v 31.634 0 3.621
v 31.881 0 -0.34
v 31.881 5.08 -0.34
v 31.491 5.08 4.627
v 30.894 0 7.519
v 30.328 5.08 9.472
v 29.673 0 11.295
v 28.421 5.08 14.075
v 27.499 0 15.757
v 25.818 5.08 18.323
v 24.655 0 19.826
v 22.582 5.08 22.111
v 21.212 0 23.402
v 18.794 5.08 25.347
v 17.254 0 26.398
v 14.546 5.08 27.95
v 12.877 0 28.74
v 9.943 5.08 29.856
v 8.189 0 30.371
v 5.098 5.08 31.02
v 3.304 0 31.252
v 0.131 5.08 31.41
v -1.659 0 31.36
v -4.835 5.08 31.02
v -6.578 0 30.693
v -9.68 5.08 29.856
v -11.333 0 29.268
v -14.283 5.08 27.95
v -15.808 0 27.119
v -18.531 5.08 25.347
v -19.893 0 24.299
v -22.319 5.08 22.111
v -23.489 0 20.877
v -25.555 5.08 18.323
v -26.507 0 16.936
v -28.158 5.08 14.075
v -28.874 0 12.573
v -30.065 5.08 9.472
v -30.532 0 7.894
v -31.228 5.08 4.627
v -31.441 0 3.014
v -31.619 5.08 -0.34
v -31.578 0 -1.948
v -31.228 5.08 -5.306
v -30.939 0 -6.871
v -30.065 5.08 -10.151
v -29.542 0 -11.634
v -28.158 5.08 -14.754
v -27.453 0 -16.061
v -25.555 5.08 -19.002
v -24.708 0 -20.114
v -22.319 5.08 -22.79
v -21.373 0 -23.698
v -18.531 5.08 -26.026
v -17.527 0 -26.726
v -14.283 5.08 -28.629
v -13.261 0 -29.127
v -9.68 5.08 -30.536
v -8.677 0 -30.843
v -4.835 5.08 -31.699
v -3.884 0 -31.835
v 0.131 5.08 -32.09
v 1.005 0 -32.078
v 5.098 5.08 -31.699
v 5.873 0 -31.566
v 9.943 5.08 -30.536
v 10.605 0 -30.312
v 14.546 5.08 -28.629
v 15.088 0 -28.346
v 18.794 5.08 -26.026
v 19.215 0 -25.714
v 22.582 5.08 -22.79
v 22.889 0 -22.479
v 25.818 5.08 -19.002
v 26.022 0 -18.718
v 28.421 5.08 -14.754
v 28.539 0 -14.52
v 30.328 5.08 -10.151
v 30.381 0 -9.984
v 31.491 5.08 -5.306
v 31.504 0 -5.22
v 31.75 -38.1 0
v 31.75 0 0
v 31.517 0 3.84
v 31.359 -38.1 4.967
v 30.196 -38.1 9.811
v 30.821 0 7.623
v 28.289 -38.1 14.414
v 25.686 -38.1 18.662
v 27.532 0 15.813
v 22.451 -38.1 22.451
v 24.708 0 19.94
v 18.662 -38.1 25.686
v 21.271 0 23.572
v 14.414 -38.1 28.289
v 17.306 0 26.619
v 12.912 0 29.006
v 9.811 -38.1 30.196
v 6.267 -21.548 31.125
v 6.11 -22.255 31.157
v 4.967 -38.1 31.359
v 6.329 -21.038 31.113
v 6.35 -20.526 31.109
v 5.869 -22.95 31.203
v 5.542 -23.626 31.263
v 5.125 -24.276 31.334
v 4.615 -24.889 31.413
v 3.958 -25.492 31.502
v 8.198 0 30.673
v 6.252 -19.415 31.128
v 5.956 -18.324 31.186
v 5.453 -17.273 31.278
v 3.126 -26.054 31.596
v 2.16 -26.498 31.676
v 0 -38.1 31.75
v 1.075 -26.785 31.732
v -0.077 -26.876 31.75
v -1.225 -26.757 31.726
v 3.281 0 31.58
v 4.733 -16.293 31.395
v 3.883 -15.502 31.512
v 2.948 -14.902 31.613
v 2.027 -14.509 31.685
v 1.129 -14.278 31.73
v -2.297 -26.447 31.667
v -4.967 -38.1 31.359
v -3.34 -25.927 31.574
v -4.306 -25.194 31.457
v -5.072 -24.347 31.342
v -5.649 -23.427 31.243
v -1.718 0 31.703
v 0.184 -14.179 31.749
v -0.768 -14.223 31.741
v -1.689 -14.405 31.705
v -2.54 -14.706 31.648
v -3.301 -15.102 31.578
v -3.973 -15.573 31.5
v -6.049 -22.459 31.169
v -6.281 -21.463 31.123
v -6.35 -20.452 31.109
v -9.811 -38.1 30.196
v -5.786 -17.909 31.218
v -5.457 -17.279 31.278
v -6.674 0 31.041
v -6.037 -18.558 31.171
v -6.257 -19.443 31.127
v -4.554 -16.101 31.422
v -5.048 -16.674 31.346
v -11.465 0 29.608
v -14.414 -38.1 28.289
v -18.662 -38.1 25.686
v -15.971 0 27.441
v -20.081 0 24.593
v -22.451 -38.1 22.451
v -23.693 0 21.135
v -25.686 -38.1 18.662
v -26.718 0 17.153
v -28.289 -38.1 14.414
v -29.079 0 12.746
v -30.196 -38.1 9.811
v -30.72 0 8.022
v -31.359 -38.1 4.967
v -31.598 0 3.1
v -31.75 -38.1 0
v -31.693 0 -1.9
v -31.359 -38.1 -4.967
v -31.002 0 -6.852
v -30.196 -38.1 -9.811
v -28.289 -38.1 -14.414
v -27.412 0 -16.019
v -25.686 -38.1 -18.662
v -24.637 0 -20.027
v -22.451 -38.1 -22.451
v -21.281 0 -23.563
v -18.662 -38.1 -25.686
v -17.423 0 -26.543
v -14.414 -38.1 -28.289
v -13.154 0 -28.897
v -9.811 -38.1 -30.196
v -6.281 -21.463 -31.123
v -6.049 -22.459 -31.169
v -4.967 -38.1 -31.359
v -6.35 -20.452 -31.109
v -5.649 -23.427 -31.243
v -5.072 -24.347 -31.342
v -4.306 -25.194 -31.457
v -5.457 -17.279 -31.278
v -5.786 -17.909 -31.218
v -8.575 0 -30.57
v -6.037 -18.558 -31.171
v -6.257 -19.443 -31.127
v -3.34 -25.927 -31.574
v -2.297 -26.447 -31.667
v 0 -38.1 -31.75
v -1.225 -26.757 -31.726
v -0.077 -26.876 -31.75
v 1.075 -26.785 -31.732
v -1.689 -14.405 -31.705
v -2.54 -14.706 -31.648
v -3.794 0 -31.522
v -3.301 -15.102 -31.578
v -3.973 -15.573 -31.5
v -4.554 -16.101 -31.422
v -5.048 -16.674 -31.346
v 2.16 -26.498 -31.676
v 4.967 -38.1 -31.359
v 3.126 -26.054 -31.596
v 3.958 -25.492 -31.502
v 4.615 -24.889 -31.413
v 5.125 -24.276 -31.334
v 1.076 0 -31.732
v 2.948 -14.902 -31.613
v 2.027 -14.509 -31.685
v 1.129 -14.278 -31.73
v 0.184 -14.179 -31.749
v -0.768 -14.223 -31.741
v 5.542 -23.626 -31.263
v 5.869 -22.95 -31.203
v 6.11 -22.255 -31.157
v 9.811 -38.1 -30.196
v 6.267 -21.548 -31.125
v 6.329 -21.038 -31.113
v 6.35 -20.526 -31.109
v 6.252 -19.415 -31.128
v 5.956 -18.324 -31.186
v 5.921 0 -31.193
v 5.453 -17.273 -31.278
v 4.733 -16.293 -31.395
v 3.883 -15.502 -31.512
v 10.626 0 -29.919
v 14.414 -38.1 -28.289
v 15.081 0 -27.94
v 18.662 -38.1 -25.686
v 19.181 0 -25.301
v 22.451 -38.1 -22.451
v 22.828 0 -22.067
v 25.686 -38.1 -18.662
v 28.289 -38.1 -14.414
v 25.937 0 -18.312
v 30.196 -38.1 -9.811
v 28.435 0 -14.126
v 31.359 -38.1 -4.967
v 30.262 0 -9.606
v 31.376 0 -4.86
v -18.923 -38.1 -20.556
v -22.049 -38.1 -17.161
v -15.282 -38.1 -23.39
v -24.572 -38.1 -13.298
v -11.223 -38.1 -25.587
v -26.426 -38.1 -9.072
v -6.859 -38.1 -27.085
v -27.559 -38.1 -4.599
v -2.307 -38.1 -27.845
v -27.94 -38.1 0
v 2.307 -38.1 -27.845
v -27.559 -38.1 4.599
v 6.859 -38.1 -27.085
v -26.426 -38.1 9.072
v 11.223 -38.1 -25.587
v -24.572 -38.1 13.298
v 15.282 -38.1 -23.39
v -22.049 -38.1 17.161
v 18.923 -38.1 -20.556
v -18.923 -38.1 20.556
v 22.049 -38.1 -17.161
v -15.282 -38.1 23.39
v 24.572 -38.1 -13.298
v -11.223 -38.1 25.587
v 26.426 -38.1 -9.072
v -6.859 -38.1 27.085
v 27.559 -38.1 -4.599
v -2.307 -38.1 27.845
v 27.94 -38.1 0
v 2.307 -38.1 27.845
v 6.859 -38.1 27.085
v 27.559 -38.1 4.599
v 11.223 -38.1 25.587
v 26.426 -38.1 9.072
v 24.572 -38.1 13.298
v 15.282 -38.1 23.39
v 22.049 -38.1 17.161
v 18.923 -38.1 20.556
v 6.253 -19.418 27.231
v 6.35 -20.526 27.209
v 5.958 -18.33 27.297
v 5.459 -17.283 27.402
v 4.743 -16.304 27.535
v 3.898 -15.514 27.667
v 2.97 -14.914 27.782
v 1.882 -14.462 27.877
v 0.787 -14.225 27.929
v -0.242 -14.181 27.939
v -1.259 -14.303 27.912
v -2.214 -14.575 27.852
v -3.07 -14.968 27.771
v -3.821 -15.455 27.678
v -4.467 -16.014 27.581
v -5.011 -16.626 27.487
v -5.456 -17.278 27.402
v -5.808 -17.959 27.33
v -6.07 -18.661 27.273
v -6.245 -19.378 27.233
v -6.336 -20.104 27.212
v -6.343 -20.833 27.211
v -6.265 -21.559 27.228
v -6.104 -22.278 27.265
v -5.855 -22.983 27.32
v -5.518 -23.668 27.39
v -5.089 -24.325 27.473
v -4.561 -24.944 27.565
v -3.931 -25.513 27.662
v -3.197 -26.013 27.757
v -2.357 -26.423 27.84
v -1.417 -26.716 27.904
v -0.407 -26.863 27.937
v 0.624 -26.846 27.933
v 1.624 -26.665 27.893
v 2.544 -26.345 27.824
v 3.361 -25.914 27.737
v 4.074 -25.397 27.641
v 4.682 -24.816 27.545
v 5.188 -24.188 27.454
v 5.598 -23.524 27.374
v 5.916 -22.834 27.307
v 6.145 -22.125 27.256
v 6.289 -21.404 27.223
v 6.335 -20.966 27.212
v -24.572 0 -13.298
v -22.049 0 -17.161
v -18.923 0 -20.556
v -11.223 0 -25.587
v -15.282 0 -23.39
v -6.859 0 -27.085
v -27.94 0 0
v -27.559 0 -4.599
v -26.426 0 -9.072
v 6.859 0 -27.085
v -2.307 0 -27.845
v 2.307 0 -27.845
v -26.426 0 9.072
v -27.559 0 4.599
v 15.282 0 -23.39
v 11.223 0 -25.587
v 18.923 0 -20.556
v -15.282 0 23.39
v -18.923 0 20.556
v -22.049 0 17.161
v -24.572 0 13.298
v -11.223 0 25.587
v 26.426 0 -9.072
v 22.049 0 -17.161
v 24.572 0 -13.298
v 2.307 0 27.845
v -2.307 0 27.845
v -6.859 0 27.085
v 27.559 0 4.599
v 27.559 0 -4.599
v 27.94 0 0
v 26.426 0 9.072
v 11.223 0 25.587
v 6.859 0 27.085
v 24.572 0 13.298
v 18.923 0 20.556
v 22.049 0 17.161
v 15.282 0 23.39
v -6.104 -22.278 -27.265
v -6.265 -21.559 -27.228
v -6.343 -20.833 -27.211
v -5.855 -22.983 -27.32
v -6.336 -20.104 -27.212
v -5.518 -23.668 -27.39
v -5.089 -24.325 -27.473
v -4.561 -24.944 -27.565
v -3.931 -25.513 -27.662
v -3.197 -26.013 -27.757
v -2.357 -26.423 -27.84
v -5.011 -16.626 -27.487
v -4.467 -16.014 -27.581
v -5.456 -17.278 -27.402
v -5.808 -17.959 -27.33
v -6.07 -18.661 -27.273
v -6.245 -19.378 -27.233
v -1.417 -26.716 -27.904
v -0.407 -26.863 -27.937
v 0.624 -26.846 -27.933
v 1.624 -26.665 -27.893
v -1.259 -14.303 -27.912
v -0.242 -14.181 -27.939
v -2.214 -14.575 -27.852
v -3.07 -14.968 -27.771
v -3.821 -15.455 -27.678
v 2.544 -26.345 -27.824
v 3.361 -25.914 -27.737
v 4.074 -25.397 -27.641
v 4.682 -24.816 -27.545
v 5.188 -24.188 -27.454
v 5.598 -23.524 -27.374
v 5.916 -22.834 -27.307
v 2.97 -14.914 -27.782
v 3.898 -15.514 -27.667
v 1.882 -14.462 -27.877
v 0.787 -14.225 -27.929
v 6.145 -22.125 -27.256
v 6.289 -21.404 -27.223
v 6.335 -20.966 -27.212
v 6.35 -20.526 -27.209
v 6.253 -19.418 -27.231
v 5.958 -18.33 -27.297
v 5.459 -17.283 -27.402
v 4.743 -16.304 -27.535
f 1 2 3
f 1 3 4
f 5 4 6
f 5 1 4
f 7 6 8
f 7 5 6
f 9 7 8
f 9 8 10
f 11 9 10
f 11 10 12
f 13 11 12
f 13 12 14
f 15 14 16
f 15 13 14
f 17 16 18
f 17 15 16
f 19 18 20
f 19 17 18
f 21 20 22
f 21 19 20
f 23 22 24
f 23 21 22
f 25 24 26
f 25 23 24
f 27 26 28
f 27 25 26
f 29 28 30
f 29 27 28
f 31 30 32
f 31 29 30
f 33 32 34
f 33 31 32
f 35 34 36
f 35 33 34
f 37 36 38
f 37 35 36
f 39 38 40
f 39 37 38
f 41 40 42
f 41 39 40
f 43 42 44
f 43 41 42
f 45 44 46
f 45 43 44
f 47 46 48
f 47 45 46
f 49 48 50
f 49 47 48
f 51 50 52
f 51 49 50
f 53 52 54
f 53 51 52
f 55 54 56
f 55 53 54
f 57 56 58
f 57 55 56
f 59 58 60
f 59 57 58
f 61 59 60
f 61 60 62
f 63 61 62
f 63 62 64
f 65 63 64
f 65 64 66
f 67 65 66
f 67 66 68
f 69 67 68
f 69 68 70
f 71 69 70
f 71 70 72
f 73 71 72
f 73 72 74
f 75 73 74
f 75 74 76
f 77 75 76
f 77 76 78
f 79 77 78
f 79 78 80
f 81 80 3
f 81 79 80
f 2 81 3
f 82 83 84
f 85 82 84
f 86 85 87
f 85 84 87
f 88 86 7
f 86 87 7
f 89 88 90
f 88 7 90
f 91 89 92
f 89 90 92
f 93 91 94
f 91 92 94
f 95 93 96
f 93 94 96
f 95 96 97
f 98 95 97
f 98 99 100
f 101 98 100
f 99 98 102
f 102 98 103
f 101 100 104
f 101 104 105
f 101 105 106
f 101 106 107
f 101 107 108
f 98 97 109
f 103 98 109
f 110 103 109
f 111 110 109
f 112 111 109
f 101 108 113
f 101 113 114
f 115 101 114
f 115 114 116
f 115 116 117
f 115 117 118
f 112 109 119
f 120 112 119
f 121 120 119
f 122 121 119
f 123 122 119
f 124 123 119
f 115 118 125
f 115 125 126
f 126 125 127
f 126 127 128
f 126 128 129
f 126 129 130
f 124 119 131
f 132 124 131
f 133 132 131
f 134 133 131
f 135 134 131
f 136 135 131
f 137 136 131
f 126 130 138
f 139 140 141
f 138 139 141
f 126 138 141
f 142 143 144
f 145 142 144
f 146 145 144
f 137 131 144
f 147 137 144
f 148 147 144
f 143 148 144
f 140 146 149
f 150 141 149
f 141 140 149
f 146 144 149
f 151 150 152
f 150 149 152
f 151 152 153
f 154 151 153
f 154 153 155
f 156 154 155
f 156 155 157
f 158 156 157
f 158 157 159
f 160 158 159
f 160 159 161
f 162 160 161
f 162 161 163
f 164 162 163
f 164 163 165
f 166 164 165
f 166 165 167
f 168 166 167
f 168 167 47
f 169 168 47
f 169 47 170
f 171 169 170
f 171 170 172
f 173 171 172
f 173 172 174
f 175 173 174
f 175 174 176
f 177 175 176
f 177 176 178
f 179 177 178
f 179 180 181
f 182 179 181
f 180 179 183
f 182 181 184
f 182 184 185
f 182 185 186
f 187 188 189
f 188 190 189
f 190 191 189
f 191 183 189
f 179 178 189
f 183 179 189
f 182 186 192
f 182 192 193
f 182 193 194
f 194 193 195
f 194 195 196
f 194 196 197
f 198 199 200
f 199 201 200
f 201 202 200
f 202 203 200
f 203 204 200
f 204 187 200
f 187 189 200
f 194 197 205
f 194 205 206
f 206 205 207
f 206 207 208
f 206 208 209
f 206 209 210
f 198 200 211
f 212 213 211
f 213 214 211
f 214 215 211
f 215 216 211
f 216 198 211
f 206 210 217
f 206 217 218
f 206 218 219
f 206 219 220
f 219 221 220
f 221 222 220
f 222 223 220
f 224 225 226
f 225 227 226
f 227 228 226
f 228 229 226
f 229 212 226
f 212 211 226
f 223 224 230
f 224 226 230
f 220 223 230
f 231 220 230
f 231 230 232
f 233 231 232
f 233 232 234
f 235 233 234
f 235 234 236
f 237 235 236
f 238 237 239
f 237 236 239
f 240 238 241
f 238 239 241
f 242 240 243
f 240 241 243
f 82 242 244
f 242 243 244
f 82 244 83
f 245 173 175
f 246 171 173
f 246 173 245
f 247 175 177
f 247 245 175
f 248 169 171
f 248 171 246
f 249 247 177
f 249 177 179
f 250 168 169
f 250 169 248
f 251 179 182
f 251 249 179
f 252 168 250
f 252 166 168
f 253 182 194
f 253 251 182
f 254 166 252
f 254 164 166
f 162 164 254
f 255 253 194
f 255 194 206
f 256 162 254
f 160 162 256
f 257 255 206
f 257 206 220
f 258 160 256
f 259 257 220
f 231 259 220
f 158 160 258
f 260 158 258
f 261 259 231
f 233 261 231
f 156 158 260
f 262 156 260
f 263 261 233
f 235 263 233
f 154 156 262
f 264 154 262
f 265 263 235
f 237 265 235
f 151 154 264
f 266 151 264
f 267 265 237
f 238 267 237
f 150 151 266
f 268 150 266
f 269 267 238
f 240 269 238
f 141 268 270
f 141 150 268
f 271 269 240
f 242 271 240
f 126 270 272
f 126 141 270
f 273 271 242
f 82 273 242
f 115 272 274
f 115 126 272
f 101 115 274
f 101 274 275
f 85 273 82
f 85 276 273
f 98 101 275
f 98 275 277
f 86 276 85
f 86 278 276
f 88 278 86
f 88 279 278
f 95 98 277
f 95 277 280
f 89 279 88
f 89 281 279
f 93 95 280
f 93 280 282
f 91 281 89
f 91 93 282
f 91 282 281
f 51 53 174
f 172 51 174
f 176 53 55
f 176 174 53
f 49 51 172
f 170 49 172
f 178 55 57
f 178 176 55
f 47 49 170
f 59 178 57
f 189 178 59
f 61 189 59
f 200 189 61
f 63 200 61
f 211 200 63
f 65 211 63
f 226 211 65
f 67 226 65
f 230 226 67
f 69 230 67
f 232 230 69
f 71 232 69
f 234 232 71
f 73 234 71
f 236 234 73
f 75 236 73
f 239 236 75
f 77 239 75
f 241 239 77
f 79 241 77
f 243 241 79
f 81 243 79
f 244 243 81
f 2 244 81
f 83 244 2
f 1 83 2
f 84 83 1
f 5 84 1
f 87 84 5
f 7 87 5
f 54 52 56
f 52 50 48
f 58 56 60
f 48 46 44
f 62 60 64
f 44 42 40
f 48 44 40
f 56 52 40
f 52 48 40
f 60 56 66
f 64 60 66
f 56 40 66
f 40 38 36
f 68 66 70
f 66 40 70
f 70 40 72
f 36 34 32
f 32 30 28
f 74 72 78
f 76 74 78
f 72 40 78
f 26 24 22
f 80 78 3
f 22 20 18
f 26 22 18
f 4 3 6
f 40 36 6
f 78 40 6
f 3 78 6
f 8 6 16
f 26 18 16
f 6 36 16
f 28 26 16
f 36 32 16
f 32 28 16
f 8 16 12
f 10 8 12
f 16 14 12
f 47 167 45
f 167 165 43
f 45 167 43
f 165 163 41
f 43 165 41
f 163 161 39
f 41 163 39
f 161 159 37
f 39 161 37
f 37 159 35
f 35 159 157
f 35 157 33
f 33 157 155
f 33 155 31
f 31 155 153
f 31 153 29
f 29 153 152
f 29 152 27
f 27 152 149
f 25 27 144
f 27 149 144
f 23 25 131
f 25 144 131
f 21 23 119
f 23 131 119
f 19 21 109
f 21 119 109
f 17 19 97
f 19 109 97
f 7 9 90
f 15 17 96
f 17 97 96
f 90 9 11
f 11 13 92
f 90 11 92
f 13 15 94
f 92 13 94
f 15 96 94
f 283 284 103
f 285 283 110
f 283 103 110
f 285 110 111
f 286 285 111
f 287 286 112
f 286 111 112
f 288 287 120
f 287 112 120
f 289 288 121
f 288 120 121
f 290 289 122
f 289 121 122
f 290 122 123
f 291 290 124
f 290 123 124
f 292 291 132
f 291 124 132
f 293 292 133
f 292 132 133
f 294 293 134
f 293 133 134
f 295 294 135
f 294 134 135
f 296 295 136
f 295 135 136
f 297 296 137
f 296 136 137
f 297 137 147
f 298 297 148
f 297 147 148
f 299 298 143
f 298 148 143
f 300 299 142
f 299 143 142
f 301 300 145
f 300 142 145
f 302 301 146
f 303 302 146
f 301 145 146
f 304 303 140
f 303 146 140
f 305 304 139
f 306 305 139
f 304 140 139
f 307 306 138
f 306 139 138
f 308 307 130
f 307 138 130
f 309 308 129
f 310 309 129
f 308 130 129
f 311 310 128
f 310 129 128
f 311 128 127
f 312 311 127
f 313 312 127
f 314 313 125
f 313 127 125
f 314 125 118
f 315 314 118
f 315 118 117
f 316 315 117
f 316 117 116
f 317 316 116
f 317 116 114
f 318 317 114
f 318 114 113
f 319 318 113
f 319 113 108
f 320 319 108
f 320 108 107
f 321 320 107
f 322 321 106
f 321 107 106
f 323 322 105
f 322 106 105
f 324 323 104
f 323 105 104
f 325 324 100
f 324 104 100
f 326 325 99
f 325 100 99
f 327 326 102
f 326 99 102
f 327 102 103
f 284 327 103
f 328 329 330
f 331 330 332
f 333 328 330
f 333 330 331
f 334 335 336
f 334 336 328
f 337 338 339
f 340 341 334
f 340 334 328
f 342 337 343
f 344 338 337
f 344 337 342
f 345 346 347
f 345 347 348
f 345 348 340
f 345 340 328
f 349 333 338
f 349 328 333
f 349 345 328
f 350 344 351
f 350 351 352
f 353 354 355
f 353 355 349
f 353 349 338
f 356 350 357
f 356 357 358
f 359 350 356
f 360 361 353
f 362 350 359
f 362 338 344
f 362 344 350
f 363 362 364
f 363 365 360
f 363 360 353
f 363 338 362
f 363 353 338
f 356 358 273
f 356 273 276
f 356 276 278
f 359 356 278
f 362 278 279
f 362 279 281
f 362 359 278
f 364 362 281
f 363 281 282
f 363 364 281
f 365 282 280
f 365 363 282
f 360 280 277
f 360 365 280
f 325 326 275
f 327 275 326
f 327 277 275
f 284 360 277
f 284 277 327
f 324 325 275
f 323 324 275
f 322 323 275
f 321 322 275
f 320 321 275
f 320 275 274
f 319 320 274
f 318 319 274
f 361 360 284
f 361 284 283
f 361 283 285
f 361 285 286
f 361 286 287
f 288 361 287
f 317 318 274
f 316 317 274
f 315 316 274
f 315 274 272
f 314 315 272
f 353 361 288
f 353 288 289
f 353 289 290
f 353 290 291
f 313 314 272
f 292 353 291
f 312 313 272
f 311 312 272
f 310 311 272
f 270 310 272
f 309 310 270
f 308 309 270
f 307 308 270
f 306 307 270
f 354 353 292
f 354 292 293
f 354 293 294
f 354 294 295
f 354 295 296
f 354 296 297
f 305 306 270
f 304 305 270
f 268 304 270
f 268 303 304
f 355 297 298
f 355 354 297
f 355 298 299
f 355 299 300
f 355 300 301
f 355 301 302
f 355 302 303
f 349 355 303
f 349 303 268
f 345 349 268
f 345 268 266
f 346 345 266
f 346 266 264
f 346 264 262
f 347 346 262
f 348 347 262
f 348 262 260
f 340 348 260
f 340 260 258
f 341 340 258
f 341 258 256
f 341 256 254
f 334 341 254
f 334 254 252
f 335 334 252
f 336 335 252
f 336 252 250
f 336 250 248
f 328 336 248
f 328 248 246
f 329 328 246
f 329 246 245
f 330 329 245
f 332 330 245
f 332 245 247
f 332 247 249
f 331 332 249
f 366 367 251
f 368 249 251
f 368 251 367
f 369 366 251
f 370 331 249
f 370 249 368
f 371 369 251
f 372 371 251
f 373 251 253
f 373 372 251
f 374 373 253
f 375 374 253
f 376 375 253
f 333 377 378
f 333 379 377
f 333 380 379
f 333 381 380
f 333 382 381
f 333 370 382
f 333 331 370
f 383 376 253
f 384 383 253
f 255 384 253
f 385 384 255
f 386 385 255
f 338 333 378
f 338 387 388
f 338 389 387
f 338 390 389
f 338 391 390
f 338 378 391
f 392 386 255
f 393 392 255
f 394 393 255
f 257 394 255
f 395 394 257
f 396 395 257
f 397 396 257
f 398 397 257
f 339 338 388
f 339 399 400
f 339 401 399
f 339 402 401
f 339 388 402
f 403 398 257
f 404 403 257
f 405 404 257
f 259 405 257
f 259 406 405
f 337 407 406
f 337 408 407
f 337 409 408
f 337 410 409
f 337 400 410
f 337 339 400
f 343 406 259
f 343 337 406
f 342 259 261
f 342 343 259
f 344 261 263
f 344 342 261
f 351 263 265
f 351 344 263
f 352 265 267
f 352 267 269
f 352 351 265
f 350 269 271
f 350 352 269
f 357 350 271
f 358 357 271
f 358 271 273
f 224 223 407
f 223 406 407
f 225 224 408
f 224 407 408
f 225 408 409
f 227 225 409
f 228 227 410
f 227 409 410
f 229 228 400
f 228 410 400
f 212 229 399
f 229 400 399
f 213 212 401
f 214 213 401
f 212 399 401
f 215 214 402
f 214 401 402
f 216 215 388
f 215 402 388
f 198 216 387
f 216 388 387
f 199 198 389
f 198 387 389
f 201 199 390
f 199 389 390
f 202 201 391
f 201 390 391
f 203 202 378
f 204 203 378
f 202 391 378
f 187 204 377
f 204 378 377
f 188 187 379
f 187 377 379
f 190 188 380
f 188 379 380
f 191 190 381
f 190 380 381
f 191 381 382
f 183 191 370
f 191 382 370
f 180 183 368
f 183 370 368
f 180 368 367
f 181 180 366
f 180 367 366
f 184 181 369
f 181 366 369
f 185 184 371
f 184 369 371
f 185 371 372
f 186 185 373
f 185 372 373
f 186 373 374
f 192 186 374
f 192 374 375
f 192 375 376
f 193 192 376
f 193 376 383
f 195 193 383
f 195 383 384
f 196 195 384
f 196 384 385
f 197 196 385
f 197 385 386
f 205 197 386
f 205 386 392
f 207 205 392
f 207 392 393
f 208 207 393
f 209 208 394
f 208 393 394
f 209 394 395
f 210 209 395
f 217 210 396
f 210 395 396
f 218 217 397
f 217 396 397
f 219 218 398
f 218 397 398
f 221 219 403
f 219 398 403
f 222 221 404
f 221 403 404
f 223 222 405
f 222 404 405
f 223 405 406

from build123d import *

# Parameters (mm, degrees)
F0_R     = 31.75
F0_R_2   = 27.94
F1_DEPTH = 38.1
F2_R     = 31.75
F3_DEPTH = 5.08
F4_R     = 6.35
F5_DEPTH = 61.976


with BuildPart() as f1:
    # F0 (on Front) → F1 (new body)
    with BuildSketch(Plane.XZ):
        Circle(F0_R)
        Circle(F0_R_2, mode=Mode.SUBTRACT)
    extrude(amount=F1_DEPTH)

    # F2 (on Front) → F3 (join)
    with BuildSketch(Plane.XZ):
        with Locations((0.1314867404, -0.3395704844)):
            Circle(F2_R)
    extrude(amount=-F3_DEPTH)

    # F4 (on Top) → F5 (cut, symmetric)
    with BuildSketch(Plane.XY):
        with Locations((0, -20.52645199)):
            Circle(F4_R)
    extrude(amount=F5_DEPTH, both=True, mode=Mode.SUBTRACT)


solid = f1.part
